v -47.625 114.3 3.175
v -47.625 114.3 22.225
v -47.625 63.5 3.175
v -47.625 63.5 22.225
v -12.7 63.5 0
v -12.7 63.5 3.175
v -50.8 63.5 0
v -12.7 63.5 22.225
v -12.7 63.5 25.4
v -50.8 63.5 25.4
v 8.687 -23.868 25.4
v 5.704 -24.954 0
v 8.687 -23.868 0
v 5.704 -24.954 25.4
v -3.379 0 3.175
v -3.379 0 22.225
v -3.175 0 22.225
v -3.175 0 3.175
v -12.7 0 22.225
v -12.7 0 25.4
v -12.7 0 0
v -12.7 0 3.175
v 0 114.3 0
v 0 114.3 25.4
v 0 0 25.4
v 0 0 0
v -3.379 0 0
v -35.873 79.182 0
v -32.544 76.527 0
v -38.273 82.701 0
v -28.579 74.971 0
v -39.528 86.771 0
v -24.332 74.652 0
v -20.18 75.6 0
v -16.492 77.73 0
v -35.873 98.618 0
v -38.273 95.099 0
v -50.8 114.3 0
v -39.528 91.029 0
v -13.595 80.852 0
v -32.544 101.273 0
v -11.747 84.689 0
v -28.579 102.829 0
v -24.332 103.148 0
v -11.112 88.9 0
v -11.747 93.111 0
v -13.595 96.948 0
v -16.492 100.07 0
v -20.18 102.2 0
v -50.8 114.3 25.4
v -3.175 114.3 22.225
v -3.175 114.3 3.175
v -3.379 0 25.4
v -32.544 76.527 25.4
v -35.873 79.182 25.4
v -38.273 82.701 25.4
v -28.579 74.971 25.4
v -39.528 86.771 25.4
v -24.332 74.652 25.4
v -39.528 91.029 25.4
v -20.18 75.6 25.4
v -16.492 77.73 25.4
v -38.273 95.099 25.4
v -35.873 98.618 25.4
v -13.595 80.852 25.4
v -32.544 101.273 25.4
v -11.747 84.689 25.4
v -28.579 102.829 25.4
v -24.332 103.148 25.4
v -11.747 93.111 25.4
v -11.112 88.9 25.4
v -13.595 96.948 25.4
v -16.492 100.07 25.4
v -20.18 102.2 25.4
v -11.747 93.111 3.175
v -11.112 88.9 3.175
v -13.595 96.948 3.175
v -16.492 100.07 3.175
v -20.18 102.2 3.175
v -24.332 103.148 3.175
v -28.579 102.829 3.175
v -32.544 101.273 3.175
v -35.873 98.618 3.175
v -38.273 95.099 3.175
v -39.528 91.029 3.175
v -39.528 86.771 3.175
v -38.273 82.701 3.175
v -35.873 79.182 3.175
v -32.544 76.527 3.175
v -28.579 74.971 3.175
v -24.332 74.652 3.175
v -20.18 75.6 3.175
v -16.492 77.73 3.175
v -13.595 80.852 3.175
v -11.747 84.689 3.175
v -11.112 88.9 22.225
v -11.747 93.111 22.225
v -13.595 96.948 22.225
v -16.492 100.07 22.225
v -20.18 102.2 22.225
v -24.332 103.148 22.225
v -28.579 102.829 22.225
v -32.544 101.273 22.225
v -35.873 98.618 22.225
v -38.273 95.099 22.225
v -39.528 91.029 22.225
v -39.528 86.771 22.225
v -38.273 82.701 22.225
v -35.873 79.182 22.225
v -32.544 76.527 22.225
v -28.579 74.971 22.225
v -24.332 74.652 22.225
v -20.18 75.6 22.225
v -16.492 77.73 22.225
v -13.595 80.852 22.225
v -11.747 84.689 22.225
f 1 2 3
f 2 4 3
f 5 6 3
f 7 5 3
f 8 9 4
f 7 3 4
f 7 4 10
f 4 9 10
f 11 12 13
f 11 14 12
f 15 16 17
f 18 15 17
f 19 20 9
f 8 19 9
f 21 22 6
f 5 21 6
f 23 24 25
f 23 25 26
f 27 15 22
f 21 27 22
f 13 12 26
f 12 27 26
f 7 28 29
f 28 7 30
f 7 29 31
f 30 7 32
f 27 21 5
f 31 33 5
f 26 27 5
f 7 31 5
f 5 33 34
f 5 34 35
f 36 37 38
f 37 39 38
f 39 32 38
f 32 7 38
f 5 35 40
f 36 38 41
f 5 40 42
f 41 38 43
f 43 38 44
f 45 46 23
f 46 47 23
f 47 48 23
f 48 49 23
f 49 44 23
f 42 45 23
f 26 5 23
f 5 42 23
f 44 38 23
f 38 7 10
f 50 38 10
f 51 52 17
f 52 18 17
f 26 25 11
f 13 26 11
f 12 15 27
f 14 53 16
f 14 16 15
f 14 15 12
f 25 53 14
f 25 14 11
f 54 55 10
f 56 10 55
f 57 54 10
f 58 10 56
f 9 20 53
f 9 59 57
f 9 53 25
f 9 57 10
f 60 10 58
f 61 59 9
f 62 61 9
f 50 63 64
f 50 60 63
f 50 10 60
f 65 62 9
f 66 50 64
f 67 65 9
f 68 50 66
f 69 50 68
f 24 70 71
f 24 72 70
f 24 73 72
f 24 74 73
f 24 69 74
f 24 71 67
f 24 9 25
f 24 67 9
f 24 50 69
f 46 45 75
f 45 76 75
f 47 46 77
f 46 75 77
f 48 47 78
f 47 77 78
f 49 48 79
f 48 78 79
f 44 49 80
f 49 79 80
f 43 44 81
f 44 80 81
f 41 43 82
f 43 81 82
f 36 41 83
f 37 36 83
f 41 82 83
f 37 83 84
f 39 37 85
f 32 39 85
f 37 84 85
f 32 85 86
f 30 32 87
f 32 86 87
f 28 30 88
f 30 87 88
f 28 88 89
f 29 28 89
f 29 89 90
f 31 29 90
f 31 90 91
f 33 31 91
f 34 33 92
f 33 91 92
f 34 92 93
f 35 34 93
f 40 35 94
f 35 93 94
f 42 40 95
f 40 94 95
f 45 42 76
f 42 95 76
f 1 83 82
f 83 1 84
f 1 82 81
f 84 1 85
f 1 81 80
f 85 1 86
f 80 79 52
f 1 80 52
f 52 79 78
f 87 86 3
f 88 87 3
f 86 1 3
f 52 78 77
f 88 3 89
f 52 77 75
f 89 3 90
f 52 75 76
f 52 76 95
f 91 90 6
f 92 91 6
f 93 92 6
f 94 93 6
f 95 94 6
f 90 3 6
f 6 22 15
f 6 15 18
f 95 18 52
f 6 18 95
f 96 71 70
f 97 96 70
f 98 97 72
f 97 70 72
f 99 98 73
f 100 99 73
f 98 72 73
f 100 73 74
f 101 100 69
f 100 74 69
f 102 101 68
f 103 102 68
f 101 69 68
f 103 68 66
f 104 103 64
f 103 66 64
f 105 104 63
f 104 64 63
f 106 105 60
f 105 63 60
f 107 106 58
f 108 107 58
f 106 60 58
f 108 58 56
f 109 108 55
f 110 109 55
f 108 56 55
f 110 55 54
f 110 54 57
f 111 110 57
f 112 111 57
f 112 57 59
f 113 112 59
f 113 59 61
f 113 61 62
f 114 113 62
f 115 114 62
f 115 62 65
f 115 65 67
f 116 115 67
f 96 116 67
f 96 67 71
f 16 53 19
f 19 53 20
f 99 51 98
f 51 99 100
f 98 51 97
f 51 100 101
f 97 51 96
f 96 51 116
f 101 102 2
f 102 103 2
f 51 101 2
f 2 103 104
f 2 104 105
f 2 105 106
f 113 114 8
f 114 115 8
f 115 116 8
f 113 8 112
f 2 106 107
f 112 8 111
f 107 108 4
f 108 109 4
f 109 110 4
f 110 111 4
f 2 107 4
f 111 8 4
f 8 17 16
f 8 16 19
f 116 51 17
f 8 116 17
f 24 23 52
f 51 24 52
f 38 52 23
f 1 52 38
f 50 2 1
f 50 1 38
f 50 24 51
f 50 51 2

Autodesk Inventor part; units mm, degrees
ref_plane "YZ Plane" through (0, 0, 0) normal (1, 0, 0) x (0, 1, 0)
ref_plane "XZ Plane" through (0, 0, 0) normal (0, 1, 0) x (-1, 0, 0)
ref_plane "XY Plane" through (0, 0, 0) normal (0, 0, 1) x (1, 0, 0)
sketch "Sketch1" plane through (0, 0, 0) normal (0, 1, 0) x (-1, 0, 0)
  line L0 (0, 0) -> (50.8, 0)
  line L1 (50.8, 0) -> (50.8, 25.4)
  line L2 (50.8, 25.4) -> (0, 25.4)
  line L3 (0, 25.4) -> (0, 0)
  line L4 (47.625, 3.175) -> (3.175, 3.175)
  line L5 (3.175, 3.175) -> (3.175, 22.225)
  line L6 (3.175, 22.225) -> (47.625, 22.225)
  line L7 (47.625, 22.225) -> (47.625, 3.175)
  dimension "d0" = 50.8
  dimension "d1" = 25.4
  dimension "d2" = 3.175
extrude "Extrusion1" add sketch "Sketch1" along normal blind 114.3
sketch "Sketch2" plane through (-50.8, 0, 25.4) normal (0, 0, 1) x (1, 0, 0)
  line L0 (0, 0) -> (38.1, 0)
  line L1 (38.1, 0) -> (38.1, 63.5)
  line L2 (38.1, 63.5) -> (0, 63.5)
  line L3 (0, 63.5) -> (0, 0)
  line L4 (0, 0) -> (50.8, 0) projected
  line L5 (0, 0) -> (0, 114.3) projected
  dimension "d5" = 38.1
  dimension "d6" = 63.5
extrude "Extrusion2" cut sketch "Sketch2" against normal blind 25.4
sketch "Sketch3" plane through (-50.8, 114.3, 25.4) normal (0, 0, 1) x (1, 0, 0)
  circle A0 centre (25.4, -25.4) radius 14.2875
  line L0 (0, 0) -> (50.8, 0) projected
  line L1 (0, -50.8) -> (0, 0) projected
  point P0 (50.8, -114.3)
  dimension "d9" = 28.575
  dimension "d10" = 25.4
  dimension "d11" = 25.4
extrude "Extrusion3" cut sketch "Sketch3" against normal blind 25.4
sketch "Sketch4" plane through (-50.8, 114.3, 25.4) normal (0, 0, 1) x (1, 0, 0)
  line L0 (50.8, -114.3) -> (59.4873, -138.1682)
  line L1 (47.4212, -114.3) -> (56.5038, -139.2541)
  line L2 (56.5038, -139.2541) -> (59.4873, -138.1682)
  line L3 (38.1, -114.3) -> (50.8, -114.3) projected
  line L4 (50.8, -114.3) -> (47.4212, -114.3)
  dimension "d14" = 25.4
  dimension "d15" = 3.175
  dimension "d16" = 110
extrude "Extrusion4" add sketch "Sketch4" against normal blind 25.4
properties part number "thumb block" material "Aluminum 6061"
